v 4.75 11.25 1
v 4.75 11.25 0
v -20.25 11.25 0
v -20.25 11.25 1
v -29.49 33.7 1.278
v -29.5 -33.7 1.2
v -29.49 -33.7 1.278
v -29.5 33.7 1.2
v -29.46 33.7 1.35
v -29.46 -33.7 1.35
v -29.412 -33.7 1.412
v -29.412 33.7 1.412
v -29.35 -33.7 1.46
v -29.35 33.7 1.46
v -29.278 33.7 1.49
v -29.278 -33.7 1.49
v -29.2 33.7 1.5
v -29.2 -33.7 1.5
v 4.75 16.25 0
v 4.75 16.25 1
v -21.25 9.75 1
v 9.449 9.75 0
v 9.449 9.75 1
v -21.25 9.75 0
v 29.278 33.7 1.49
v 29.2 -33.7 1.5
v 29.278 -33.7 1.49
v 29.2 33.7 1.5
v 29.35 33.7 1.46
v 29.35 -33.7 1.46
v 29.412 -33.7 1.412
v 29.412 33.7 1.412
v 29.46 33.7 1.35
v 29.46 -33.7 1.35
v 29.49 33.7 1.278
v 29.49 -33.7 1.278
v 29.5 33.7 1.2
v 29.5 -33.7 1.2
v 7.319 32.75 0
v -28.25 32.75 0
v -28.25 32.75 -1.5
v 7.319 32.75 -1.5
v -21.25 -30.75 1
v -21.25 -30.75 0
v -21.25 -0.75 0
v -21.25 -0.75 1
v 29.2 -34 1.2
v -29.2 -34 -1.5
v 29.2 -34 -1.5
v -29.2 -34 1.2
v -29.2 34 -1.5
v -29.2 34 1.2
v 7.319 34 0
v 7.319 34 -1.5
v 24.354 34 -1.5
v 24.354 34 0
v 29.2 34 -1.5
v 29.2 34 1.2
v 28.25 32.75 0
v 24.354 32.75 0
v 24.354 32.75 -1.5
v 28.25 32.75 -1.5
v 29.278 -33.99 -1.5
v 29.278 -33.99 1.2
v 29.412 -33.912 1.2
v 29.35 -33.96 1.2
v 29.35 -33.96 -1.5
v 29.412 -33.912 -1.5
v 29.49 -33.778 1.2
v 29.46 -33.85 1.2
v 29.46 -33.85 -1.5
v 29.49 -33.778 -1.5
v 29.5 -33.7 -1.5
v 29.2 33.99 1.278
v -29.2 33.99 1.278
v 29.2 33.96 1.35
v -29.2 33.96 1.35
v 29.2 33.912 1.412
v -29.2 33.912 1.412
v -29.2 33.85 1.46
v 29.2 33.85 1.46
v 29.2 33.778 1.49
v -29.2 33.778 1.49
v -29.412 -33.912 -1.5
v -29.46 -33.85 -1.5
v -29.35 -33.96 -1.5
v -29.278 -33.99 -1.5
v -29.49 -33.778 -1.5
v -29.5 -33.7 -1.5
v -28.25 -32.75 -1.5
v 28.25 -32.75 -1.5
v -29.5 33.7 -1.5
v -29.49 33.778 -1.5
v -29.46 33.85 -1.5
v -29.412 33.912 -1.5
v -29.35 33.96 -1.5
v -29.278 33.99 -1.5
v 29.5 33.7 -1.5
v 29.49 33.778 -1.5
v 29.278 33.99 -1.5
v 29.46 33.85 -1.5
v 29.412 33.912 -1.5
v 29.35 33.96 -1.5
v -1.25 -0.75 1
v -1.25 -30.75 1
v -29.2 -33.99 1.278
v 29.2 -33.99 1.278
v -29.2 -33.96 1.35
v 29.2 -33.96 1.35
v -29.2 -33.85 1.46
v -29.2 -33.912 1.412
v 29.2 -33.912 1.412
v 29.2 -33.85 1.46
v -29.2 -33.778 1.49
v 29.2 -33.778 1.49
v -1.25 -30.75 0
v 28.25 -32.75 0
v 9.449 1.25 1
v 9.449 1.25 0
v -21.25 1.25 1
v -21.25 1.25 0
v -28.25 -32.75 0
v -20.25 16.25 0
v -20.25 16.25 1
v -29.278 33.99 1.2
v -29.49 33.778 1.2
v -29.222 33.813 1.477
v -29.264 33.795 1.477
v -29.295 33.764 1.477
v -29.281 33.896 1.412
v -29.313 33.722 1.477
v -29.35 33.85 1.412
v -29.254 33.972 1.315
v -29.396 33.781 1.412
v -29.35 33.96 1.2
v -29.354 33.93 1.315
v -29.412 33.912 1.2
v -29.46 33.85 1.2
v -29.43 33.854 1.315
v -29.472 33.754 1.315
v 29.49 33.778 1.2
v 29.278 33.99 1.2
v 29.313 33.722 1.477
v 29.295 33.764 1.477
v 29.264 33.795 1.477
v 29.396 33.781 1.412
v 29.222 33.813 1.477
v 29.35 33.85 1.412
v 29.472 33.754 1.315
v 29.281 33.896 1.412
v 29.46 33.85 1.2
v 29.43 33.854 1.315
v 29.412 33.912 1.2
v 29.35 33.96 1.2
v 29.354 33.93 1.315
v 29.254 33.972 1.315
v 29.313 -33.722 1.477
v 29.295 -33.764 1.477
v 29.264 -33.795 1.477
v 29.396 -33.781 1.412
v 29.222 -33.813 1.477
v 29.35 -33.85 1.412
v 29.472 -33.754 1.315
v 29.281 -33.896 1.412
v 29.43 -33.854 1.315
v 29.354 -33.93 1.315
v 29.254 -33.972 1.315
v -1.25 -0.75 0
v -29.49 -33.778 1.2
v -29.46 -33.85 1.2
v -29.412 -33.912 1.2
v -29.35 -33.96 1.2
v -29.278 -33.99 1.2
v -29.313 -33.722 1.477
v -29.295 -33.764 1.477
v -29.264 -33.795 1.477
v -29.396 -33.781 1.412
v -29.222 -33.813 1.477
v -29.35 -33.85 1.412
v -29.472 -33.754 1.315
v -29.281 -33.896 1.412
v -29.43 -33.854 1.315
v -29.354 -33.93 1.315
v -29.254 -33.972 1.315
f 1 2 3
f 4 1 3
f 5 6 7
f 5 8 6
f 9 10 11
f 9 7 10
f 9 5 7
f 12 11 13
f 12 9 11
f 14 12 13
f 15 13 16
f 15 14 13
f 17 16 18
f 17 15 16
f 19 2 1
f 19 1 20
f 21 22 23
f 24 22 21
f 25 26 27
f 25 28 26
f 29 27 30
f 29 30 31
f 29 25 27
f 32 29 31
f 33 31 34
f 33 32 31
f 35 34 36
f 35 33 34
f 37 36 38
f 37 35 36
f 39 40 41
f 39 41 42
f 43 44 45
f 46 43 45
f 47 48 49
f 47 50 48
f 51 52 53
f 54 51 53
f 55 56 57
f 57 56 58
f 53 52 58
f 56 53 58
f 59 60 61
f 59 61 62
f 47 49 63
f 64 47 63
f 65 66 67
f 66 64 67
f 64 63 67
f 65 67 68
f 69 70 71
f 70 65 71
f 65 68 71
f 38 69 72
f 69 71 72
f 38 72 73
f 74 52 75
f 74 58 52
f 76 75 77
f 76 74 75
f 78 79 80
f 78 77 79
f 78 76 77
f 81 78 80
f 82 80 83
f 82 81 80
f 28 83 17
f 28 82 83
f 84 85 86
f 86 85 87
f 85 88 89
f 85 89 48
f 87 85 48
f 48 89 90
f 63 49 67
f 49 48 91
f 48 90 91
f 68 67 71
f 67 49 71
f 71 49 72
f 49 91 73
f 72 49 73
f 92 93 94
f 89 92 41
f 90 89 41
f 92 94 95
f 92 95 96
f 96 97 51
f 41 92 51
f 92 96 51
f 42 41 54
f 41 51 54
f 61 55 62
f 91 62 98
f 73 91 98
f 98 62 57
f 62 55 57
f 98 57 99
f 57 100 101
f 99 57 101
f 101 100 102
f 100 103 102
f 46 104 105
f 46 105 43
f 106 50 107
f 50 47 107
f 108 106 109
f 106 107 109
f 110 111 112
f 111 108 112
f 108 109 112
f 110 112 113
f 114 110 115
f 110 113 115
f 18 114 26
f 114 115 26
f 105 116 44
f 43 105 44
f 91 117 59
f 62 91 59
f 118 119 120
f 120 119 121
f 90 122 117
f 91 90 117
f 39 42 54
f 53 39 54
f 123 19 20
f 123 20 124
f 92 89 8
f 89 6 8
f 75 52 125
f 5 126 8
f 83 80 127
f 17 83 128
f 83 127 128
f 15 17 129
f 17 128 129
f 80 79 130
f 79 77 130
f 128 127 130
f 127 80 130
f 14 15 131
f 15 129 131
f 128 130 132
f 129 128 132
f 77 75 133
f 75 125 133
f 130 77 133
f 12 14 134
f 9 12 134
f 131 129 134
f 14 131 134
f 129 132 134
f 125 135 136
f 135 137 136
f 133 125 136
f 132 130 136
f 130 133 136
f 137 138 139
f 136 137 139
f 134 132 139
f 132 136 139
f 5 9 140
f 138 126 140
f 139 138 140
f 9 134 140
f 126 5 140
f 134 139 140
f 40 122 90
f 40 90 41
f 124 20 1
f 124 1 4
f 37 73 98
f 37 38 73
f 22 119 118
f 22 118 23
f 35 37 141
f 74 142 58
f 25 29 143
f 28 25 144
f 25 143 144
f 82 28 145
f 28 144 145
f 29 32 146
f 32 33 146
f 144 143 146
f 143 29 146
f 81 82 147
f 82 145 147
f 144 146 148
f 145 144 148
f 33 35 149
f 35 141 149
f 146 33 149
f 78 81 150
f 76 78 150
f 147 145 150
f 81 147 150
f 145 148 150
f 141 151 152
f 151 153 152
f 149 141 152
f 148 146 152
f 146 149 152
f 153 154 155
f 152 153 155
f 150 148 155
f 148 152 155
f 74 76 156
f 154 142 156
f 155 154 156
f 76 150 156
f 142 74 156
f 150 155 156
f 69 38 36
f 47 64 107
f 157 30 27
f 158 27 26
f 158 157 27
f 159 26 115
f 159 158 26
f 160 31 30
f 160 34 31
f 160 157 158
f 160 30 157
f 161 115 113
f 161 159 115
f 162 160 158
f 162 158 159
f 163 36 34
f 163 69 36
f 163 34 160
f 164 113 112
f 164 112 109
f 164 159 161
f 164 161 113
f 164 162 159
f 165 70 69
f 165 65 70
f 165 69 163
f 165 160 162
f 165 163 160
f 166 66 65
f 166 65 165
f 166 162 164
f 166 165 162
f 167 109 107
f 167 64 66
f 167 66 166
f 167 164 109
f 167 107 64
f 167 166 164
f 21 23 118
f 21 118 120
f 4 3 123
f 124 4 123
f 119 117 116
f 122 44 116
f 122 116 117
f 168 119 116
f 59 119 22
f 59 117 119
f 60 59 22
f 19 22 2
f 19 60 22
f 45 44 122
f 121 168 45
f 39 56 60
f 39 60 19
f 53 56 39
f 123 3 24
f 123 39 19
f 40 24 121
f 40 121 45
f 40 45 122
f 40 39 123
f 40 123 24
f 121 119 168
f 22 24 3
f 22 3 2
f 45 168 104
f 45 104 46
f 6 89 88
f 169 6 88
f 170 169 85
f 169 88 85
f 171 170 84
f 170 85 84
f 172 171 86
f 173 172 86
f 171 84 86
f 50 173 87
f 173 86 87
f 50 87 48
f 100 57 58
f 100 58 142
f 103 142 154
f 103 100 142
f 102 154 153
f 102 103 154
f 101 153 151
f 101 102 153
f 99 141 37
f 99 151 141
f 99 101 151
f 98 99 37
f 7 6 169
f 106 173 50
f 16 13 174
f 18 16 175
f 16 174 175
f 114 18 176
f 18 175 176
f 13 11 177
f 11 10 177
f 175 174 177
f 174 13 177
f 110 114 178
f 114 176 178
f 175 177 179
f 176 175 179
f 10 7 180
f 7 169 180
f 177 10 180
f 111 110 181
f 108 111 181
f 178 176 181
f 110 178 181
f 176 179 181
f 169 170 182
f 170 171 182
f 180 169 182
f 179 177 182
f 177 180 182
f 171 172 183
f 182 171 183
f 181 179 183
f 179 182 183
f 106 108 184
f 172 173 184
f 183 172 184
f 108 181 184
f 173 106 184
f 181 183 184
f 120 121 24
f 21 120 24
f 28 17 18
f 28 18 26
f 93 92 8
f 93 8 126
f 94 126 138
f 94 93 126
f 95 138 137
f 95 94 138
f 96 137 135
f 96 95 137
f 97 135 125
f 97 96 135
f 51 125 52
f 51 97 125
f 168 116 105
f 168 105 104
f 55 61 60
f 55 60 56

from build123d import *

# Parameters (mm, degrees)
SKETCH_1_W          = 56.5
SKETCH_1_H          = 65.5
EXTRUDE_1_DEPTH     = 1.5
SKETCH_2_W          = 59
SKETCH_2_H          = 68
SKETCH_2_W_2        = 56.5
SKETCH_2_H_2        = 65.5
EXTRUDE_2_DEPTH     = 3
FILLET_1_R          = 0.3
SKETCH_4_W          = 25
SKETCH_4_H          = 5
SKETCH_4_W_2        = 30.699386717
SKETCH_4_H_2        = 8.5
SKETCH_4_W_3        = 20
SKETCH_4_H_3        = 30
CUT_EXTRUDE_1_DEPTH = 1
SKETCH_5_W          = 17.035074377
SKETCH_5_H          = 1.25
CUT_EXTRUDE_2_DEPTH = 1.5


with BuildPart() as part:
    # 草图1 → 凸台-拉伸1 (new body)
    with BuildSketch(Plane.XY):
        Rectangle(SKETCH_1_W, SKETCH_1_H)
    extrude(amount=EXTRUDE_1_DEPTH)

    # 草图2 → 凸台-拉伸2 (add)
    with BuildSketch(Plane.XY.offset(1.5)):
        Rectangle(SKETCH_2_W, SKETCH_2_H)
        Rectangle(SKETCH_2_W_2, SKETCH_2_H_2, mode=Mode.SUBTRACT)
    extrude(amount=-EXTRUDE_2_DEPTH)

    # 圆角1
    fillet_1_edges = [part.edges().sort_by_distance(p)[0] for p in [
        (29.5, 34, 0),
        (29.5, -34, 0),
        (-29.5, -34, 0),
        (-29.5, 34, 0),
        (29.5, 0, 1.5),
        (0, 34, 1.5),
        (-29.5, 0, 1.5),
        (0, -34, 1.5),
    ]]
    fillet(fillet_1_edges, radius=FILLET_1_R)

    # 草图4 → 切除-拉伸1 (cut)
    with BuildSketch(Plane(origin=(0, 0, 0), x_dir=(-1, 0, 0), z_dir=(0, 0, -1))):
        with Locations((7.75, 13.75)):
            Rectangle(SKETCH_4_W, SKETCH_4_H)
        with Locations((5.900306641, 5.5)):
            Rectangle(SKETCH_4_W_2, SKETCH_4_H_2)
        with Locations((11.25, -15.75)):
            Rectangle(SKETCH_4_W_3, SKETCH_4_H_3)
    extrude(amount=-CUT_EXTRUDE_1_DEPTH, mode=Mode.SUBTRACT)

    # 草图5 → 切除-拉伸2 (cut)
    with BuildSketch(Plane(origin=(0, 0, -1.5), x_dir=(-1, 0, 0), z_dir=(0, 0, -1))):
        with Locations((-15.836199448, 33.375)):
            Rectangle(SKETCH_5_W, SKETCH_5_H)
    extrude(amount=-CUT_EXTRUDE_2_DEPTH, mode=Mode.SUBTRACT)


solid = part.part
